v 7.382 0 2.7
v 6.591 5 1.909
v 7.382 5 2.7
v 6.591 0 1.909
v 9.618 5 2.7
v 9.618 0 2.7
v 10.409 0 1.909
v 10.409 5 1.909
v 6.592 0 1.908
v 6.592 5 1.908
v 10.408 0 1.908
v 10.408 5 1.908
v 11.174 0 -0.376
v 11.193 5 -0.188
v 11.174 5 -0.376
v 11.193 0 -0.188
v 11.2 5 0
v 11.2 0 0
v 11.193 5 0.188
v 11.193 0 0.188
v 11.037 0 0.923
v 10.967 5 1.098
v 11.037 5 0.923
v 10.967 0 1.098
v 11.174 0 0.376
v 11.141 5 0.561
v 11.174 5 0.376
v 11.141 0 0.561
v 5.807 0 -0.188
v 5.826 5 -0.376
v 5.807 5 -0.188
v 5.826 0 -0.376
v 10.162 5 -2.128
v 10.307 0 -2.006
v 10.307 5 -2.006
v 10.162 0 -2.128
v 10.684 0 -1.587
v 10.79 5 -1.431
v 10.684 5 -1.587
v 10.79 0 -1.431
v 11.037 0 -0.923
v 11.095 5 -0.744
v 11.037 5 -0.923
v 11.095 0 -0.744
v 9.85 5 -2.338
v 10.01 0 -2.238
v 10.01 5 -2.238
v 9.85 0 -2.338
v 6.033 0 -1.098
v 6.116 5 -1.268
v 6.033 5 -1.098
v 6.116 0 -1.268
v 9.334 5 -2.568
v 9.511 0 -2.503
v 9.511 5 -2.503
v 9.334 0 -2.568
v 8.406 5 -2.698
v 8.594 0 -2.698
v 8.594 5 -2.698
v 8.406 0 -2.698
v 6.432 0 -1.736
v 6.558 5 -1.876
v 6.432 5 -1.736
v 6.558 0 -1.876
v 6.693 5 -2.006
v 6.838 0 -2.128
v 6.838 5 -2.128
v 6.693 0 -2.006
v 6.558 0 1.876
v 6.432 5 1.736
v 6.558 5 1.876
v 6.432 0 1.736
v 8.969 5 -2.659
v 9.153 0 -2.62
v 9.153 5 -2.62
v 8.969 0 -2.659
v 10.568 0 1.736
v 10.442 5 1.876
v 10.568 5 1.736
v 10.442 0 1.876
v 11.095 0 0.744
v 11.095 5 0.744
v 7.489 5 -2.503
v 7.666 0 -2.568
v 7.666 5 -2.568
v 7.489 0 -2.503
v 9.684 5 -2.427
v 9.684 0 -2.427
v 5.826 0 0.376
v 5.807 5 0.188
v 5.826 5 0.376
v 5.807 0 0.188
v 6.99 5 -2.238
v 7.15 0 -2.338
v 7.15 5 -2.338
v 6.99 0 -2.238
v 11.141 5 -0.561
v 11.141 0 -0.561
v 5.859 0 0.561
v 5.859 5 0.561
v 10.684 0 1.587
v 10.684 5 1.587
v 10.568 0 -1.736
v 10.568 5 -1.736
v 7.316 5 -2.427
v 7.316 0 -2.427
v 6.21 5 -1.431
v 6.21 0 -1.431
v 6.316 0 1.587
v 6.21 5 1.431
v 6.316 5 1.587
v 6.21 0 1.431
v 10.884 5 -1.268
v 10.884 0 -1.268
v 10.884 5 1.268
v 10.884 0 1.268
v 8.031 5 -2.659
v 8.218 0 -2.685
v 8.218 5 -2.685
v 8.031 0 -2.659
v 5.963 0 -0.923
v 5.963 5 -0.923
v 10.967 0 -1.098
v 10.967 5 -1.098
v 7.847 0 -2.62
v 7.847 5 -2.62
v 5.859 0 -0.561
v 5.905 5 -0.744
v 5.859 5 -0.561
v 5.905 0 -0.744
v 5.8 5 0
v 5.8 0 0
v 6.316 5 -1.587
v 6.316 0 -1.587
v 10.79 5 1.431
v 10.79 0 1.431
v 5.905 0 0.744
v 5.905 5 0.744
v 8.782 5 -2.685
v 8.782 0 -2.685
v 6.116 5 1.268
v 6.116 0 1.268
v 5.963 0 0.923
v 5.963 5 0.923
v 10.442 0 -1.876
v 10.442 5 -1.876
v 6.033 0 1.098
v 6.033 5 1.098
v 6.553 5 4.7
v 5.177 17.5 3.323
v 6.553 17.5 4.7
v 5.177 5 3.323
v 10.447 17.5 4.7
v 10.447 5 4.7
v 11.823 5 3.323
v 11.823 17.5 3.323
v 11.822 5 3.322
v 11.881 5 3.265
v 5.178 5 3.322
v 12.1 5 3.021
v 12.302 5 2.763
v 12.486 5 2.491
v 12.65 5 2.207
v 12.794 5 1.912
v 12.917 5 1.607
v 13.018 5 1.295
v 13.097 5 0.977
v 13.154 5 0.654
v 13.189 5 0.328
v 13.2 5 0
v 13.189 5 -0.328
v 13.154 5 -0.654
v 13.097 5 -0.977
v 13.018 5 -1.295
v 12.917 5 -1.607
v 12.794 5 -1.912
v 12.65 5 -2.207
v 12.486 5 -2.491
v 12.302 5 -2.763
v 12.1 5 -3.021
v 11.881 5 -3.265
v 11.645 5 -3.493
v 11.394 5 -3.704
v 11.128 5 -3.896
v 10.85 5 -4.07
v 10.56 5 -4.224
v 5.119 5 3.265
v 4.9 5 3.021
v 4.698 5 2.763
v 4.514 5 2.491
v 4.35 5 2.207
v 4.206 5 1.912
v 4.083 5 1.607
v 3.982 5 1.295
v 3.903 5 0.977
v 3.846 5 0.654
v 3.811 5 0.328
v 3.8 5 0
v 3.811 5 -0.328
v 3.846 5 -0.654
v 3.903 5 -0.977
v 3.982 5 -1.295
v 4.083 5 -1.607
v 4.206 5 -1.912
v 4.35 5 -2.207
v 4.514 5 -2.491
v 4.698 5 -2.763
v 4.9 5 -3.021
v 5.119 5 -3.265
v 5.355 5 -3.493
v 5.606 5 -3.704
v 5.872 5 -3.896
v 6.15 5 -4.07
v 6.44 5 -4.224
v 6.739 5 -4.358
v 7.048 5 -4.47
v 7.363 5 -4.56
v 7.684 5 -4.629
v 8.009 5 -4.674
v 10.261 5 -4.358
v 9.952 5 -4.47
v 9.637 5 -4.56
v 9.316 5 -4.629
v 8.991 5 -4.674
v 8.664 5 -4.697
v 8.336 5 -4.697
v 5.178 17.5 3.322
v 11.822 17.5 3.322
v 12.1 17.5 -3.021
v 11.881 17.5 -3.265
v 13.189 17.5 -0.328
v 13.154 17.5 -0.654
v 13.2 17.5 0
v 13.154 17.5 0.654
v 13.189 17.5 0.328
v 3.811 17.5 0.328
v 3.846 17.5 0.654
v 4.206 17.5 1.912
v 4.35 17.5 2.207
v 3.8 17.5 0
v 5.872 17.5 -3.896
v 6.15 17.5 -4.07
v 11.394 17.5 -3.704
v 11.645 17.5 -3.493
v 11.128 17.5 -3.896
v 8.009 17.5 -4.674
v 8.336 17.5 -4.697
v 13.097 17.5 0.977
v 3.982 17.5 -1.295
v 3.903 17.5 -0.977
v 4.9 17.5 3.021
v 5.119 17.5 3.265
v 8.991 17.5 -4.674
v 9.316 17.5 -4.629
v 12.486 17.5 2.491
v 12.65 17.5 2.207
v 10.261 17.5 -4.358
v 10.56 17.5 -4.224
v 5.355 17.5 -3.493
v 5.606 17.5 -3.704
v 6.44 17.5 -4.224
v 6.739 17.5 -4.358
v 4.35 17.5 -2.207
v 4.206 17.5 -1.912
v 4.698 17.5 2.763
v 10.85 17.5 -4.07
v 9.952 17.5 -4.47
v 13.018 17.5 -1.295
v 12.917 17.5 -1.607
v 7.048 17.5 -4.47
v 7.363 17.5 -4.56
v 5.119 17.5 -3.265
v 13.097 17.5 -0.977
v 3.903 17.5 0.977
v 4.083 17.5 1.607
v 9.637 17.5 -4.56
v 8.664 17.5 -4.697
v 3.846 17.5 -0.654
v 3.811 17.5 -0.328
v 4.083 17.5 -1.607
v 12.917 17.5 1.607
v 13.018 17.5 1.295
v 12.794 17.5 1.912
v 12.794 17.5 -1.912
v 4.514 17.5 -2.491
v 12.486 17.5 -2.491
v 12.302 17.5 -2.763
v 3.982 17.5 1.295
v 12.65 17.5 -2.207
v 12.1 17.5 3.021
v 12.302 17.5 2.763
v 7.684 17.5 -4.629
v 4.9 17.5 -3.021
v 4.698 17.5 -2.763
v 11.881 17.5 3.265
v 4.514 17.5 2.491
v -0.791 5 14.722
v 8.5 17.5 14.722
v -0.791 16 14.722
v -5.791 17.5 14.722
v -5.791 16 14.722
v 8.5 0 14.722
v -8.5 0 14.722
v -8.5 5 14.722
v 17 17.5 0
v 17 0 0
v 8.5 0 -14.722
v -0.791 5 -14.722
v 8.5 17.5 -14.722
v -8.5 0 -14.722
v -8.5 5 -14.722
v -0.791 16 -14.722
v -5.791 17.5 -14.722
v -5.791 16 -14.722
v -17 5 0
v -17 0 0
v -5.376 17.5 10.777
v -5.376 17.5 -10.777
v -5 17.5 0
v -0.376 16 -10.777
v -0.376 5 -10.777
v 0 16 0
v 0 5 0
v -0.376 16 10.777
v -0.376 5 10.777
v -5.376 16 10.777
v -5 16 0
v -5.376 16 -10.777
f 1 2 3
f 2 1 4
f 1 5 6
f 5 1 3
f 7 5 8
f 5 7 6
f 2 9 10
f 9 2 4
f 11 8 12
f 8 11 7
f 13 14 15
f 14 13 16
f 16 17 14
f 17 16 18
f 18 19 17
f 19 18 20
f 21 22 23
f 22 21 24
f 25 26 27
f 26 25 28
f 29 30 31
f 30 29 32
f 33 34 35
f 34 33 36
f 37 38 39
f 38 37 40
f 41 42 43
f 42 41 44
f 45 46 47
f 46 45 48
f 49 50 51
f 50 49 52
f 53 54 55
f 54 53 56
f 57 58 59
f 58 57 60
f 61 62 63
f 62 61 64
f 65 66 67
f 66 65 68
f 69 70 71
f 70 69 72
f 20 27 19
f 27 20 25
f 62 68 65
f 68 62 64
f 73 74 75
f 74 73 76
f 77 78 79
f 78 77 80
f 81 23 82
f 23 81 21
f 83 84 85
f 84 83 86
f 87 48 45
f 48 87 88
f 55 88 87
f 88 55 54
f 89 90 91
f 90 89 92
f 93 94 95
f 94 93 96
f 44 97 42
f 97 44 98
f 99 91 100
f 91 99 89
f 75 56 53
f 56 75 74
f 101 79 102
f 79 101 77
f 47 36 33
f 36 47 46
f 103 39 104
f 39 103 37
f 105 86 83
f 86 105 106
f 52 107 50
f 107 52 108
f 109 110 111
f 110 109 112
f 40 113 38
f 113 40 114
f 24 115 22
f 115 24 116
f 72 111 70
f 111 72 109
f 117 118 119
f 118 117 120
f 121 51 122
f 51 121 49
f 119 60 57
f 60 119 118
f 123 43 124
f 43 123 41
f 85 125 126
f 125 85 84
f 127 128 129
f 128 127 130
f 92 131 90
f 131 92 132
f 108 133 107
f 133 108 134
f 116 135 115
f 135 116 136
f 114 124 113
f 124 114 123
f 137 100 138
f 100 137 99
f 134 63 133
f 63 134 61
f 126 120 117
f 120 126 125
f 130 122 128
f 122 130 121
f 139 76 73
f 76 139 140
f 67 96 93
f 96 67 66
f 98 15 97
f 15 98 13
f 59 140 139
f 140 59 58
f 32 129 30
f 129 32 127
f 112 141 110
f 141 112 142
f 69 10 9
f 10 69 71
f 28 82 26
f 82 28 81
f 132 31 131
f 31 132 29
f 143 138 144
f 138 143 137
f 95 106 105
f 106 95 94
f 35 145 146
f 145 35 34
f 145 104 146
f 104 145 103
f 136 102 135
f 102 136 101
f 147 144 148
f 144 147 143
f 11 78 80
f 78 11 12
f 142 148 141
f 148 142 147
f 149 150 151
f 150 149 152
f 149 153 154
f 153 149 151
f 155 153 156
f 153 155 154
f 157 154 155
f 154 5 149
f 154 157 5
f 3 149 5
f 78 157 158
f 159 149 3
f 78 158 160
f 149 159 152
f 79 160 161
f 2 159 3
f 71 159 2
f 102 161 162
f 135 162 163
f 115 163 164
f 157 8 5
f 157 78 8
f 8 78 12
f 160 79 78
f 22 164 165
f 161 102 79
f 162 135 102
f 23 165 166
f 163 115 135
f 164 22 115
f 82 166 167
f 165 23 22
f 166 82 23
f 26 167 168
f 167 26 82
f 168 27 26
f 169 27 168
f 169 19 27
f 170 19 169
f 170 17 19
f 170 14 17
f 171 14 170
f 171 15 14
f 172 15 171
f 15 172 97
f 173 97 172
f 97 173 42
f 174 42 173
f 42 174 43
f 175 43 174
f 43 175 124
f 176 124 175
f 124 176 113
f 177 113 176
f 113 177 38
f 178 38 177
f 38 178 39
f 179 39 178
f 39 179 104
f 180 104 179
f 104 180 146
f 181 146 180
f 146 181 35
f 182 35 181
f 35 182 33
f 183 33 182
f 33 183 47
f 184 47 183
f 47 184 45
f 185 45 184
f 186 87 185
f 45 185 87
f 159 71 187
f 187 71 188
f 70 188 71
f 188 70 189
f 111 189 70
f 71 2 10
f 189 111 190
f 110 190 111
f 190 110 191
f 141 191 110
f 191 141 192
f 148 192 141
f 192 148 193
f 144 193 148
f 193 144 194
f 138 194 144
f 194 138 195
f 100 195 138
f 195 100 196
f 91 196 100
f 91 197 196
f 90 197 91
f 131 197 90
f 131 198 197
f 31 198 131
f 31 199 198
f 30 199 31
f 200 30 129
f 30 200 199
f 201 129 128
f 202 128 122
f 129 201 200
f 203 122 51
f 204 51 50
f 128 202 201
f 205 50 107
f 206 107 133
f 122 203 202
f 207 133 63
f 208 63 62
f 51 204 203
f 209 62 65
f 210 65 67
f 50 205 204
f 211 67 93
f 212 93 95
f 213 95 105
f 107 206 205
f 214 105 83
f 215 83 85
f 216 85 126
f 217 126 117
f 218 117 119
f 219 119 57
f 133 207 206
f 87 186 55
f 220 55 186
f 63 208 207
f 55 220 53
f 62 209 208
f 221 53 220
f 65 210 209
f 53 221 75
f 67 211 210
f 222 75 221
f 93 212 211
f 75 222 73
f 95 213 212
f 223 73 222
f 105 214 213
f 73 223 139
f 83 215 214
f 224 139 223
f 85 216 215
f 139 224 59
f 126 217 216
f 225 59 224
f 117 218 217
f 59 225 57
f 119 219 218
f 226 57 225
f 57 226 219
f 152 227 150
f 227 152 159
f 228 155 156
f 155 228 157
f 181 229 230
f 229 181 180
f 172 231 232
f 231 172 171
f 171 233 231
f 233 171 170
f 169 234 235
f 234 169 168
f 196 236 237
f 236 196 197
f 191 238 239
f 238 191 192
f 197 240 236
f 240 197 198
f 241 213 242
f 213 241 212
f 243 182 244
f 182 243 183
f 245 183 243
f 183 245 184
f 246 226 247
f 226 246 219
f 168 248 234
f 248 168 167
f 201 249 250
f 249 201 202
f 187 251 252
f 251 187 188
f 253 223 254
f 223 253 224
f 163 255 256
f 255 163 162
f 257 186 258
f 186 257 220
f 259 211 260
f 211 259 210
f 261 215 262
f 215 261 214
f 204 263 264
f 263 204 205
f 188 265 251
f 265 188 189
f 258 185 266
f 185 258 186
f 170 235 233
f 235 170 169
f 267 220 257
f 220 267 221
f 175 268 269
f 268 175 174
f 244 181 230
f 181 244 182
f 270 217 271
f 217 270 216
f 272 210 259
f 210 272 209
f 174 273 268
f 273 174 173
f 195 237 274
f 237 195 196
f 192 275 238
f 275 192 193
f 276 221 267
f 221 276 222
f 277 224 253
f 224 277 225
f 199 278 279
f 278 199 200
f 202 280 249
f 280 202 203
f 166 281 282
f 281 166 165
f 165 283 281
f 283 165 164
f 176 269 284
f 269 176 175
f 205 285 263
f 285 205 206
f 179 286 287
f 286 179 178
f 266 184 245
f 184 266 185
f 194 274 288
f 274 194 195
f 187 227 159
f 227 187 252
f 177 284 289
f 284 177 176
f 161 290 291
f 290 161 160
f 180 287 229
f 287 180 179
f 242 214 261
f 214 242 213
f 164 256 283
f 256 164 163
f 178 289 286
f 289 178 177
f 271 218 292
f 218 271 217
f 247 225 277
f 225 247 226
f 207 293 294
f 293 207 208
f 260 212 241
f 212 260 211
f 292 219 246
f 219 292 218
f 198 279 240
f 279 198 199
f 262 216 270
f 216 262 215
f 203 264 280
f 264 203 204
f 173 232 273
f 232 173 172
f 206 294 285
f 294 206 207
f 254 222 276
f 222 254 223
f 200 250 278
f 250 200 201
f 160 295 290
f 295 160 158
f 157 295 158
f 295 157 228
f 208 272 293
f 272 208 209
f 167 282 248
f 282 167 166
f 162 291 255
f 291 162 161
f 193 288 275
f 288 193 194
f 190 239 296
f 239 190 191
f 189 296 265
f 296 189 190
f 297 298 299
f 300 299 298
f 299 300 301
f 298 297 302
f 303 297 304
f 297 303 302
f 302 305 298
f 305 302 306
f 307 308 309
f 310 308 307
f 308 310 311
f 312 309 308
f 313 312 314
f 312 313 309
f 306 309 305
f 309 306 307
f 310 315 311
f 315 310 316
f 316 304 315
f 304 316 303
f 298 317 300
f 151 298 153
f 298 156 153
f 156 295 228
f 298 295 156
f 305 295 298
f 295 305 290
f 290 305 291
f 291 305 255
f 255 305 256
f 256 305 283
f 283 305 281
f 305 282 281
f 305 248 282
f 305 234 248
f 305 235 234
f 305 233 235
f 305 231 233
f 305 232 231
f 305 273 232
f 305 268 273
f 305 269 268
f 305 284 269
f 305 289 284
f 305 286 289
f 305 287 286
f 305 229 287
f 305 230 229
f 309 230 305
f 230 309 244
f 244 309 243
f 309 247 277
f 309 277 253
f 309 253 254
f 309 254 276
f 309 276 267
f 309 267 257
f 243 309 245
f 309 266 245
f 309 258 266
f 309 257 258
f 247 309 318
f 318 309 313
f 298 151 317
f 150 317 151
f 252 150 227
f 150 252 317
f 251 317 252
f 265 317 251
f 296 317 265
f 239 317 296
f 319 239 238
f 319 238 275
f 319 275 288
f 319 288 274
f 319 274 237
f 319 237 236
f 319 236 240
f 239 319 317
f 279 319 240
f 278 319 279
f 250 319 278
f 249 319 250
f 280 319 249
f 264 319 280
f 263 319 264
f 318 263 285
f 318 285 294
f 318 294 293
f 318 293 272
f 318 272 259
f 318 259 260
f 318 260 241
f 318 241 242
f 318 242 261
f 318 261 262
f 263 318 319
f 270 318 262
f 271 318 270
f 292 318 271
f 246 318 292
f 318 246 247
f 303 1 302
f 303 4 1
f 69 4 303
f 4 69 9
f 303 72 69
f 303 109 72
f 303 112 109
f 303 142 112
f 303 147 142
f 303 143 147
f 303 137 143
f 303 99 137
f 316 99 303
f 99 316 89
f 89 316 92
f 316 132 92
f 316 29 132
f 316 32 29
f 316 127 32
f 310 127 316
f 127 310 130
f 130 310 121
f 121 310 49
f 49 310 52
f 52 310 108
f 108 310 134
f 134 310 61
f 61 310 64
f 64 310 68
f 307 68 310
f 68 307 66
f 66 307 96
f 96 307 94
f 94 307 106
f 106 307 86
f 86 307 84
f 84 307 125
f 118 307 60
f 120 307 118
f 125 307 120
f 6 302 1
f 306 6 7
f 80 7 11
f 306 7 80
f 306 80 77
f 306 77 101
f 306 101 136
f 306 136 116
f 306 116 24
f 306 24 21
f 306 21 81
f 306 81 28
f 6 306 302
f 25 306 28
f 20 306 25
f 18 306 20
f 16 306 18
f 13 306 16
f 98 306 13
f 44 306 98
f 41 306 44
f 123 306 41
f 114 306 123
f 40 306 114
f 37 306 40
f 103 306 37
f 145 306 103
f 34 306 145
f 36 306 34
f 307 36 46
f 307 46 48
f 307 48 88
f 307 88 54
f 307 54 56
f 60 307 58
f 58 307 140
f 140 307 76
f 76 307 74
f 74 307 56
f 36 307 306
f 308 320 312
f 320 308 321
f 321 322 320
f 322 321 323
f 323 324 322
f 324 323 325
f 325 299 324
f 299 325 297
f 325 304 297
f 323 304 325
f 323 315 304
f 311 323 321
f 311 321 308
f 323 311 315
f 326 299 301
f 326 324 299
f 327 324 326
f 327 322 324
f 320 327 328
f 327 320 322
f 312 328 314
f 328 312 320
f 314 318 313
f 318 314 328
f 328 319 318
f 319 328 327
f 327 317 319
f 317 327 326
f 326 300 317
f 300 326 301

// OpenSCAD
// file: configuration.scad
////////////////////////////
//  This is a Delta printer design by Paul Chase.
////////////////////////////


slop = .2;
wall = 5;

//hotend effector vars
arm_rad = 41;



////////////////////////////
//Standard Sizes
////////////////////////////
m3_nut_rad = 6.05/2+slop;
m3_nut_height = 2.4+slop;
m3_rad = 3/2+slop;
m3_cap_rad = 3.25;
m3_washer_rad = 7/2+slop;

m4_nut_rad = 7.66/2+slop;
m4_nut_height = 3.2;
m4_rad = 4/2+slop;
m4_cap_rad = 7/2+slop;
m4_washer_rad = 2*m4_rad;

m5_nut_rad = 9.05/2+slop;
m5_nut_height = 4.7;
m5_rad = 5/2+slop;
m5_cap_rad = 8/2+slop;
m5_washer_rad = 2.1*m5_rad;
m5_cap_height = 2;

//for the tiny m3 bearings
623_width = 4;
623_rad = 10.05/2+slop;
623_bore = m3_rad;
623_inner_shoulder = 623_bore+(623_rad-m3_rad)/3;
623_outer_shoulder = 623_rad-(623_rad-m3_rad)/3;

//spacers
spacer_rad = 6/2+slop;
spacer_len = 2-slop/2;

eccentric_rad = 7.2/2+slop;
eccentric_washer_rad = 15/2+slop;
eccentric_screw_rad = 7/2+slop;
eccentric_height = 2.5;



//////////////////////////////
//Useful global functions
//////////////////////////////
module cap_cylinder(r=1, h=1, center=false){
	render() union() {
		cylinder(r=r, h=h, center=center);
		intersection(){
			rotate([0,0,22.5]) cylinder(r=r/cos(180/8), h=h, $fn=8, center=center);
			translate([0,-r/cos(180/4),0]) rotate([0,0,0]) cylinder(r=r/cos(180/4), h=h, $fn=4, center=center);
		}
	}
}

module 623_bearing(){
	union(){
		//outer
		color([.75,.75,.75]) difference(){
			cylinder(r=623_rad, h=623_width);
			translate([0,0,-.1]) cylinder(r=623_outer_shoulder, h=623_width+.2);
		}
		//middle
		color([.25,.25,.25]) difference(){
			translate([0,0,.25]) cylinder(r=623_outer_shoulder, h=623_width-.5);
			translate([0,0,-.1]) cylinder(r=623_inner_shoulder, h=623_width+.2);
		}
		//inner
		color([.75,.75,.75]) difference(){
			cylinder(r=623_inner_shoulder, h=623_width);
			translate([0,0,-.1]) cylinder(r=623_bore, h=623_width+.2);
		}
	}
}

module 623_bearing_cone(rad = 623_rad, height = 5, solid=1, nut_trap=0){
	cone_h = rad-623_inner_shoulder;
	if(nut_trap==1){
		if(solid==1){
			union(){
				echo("cone_height", cone_h);
				cylinder(r1=623_inner_shoulder, r2=rad, h=cone_h);
				translate([0,0,cone_h]) cylinder(r=rad, h=height-cone_h);
			}
		}else{
			//bore
			translate([0,0,-.1]) rotate([0,0,90]) cap_cylinder(r=623_bore, h=height+.5);
			//nut trap
			translate([0,0,height-m3_nut_height]) hull(){
				cylinder(r1=m3_nut_rad, r2=m3_nut_rad+.5, h=m3_nut_height+.5, $fn=6);
				translate([30,0,0]) cylinder(r1=m3_nut_rad, r2=m3_nut_rad+.5, h=m3_nut_height+.5, $fn=6);
			}
		}
	}else{
		if(solid==1){
			cylinder(r1=623_inner_shoulder, r2=rad, h=height);
		}else{
			translate([0,0,-.1]) rotate([0,0,90]) cap_cylinder(r=623_bore, h=height+.5);
		}
	}
}

module 623_bearing_mount(rad = 623_rad+2, height=5, solid=1){
	if(solid==1){
		union(){
			cylinder(r=rad, h=height);
		}
	}else{
		translate([0,0,height-623_width+slop]) cap_cylinder(r=623_rad, h=623_width*2);
		//translate([0,0,height-623_width]) cap_cylinder(r=623_outer_shoulder, h=623_width*2);
		translate([0,0,-height]) cap_cylinder(r=m3_cap_rad+.25, h=height*30);
	}
}

module barbell (x1,x2,r1,r2,r3,r4)
{
	x3=triangulate (x1,x2,r1+r3,r2+r3);
	x4=triangulate (x2,x1,r2+r4,r1+r4);
	render()
		difference(){
			union(){
				translate(x1) circle (r=r1);
				translate(x2) circle(r=r2);
				polygon (points=[x1,x3,x2,x4]);
			}
		translate(x3) circle(r=r3,$fa=5);
		translate(x4) circle(r=r4,$fa=5);
	}
}

function triangulate (point1, point2, length1, length2) =
point1 + length1*rotated(
atan2(point2[1]-point1[1],point2[0]-point1[0])+
angle(distance(point1,point2),length1,length2));

function distance(point1,point2)=
sqrt((point1[0]-point2[0])*(point1[0]-point2[0])+
(point1[1]-point2[1])*(point1[1]-point2[1]));

function angle(a,b,c) = acos((a*a+b*b-c*c)/(2*a*b));

function rotated(a)=[cos(a),sin(a),0];
function rotate_vec(v,a)=[cos(a)*v[0]-sin(a)*v[1],sin(a)*v[0]+cos(a)*v[1]];
// main file
include <configuration.scad>

//623_bearing();
$fn=90;


sensor_rad = 20/2;
sensor_width = 9;
sensor_length = 50+15;

bed_rad = 309/2;

bed_clamp();

//sensor_pad(height = wall+2.5);

//bed_retainer(start_height = wall+2.5, bed_thick = 7.5, glass_thick=3, bed_rad = 300/2);


module bed_clamp(bed_lift = 5, bed_thick = 11){
    clip_rad = 17;
    rotate([-90,0,0]) difference(){
        union(){
            cylinder(r=clip_rad,h=bed_lift+bed_thick+1.5, $fn=6);
        }
        translate([-bed_rad,0,bed_lift]) cylinder(r=bed_rad, h=bed_thick);
        translate([-bed_rad-wall,0,bed_lift*1.5]) cylinder(r=bed_rad, h=bed_thick);
        
        //screwhole
        translate([clip_rad/2,0,0]) {
            cap_cylinder(r=m5_rad, h=bed_thick*5, center=true);
            translate([0,0,5]) cap_cylinder(r=m5_cap_rad+.5, h=bed_thick*5);
        }
    }
}

module sensor_footprint(height = wall){
	translate([0,0,height/2]) union(){
		cube([sensor_width, sensor_length, height], center=true);
		translate([0, sensor_length/2, 0]) cylinder(r=sensor_rad, h=height, center=true);
	}
}

//this is a simple resting spot for the pressure sensor.  It recesses the sensor, and ties it in place with zip ties.
module sensor_pad(height = wall){
	sensor_recess = 1;
	min_rad = wall/2;
	difference(){
		union(){
			translate([0,0,0]) 
			minkowski(){
				sensor_footprint(height = height-.5);
				cylinder(r=min_rad, h=.5);
			}
		}

		translate([0,0,height-sensor_recess]) sensor_footprint(height = height);

		//mounting holes
		for(i=[min_rad*2-sensor_length/2,sensor_length/2]) translate([0, i, -.1]) {
			cylinder(r=m5_rad, h=height);
			translate([0,0,height-sensor_recess-m5_cap_height]) cylinder(r=m5_washer_rad, h=height);
		}

		//zip tie slots
		for(i=[-sensor_length/3,sensor_length/3]) translate([0, i, 0]) {
			rotate([0,90,0]) rotate([0,0,45]) cylinder(r=2.2, h=sensor_length, $fn=4, center=true);
			translate([0,0,height-sensor_recess+2.2/sqrt(2)]) rotate([0,90,0]) rotate([0,0,45]) cylinder(r=2.2, h=sensor_length, $fn=4, center=true);
		}
	}
}

module bed_retainer(start_height = wall+2.5, bed_thick = 7.5, glass_thick=3, bed_rad=300/2){
	height = start_height+bed_thick+glass_thick;

	//these should be related better - this is a kludge til I do the math properly.
	size = 30;
	offset = bed_rad-15;

	difference(){
		union(){
			//main body
			intersection(){
				union(){
					cube([size,size,height]);

					//wings for clips
					cube([size,size*2,glass_thick+bed_thick]);
					cube([size*2,size,glass_thick+bed_thick]);
				}
				translate([offset,offset,-.1]) cylinder(r=bed_rad+size, h=100, $fn=360);
			}
		}

		//cutout for actual bed
		translate([offset,offset,-.1]) cylinder(r=bed_rad, h=100, $fn=360);

		//cutout to miss other bits
		translate([offset,offset,glass_thick]) cylinder(r=bed_rad+wall, h=100, $fn=360);

		//screwhole for mounting
		translate([size/2,size/2,-.1]){
			cylinder(r=m5_washer_rad, h=height-wall);
			translate([0,0,height-wall+.1]) cylinder(r=m5_rad, h=height);
		}
	}
}
